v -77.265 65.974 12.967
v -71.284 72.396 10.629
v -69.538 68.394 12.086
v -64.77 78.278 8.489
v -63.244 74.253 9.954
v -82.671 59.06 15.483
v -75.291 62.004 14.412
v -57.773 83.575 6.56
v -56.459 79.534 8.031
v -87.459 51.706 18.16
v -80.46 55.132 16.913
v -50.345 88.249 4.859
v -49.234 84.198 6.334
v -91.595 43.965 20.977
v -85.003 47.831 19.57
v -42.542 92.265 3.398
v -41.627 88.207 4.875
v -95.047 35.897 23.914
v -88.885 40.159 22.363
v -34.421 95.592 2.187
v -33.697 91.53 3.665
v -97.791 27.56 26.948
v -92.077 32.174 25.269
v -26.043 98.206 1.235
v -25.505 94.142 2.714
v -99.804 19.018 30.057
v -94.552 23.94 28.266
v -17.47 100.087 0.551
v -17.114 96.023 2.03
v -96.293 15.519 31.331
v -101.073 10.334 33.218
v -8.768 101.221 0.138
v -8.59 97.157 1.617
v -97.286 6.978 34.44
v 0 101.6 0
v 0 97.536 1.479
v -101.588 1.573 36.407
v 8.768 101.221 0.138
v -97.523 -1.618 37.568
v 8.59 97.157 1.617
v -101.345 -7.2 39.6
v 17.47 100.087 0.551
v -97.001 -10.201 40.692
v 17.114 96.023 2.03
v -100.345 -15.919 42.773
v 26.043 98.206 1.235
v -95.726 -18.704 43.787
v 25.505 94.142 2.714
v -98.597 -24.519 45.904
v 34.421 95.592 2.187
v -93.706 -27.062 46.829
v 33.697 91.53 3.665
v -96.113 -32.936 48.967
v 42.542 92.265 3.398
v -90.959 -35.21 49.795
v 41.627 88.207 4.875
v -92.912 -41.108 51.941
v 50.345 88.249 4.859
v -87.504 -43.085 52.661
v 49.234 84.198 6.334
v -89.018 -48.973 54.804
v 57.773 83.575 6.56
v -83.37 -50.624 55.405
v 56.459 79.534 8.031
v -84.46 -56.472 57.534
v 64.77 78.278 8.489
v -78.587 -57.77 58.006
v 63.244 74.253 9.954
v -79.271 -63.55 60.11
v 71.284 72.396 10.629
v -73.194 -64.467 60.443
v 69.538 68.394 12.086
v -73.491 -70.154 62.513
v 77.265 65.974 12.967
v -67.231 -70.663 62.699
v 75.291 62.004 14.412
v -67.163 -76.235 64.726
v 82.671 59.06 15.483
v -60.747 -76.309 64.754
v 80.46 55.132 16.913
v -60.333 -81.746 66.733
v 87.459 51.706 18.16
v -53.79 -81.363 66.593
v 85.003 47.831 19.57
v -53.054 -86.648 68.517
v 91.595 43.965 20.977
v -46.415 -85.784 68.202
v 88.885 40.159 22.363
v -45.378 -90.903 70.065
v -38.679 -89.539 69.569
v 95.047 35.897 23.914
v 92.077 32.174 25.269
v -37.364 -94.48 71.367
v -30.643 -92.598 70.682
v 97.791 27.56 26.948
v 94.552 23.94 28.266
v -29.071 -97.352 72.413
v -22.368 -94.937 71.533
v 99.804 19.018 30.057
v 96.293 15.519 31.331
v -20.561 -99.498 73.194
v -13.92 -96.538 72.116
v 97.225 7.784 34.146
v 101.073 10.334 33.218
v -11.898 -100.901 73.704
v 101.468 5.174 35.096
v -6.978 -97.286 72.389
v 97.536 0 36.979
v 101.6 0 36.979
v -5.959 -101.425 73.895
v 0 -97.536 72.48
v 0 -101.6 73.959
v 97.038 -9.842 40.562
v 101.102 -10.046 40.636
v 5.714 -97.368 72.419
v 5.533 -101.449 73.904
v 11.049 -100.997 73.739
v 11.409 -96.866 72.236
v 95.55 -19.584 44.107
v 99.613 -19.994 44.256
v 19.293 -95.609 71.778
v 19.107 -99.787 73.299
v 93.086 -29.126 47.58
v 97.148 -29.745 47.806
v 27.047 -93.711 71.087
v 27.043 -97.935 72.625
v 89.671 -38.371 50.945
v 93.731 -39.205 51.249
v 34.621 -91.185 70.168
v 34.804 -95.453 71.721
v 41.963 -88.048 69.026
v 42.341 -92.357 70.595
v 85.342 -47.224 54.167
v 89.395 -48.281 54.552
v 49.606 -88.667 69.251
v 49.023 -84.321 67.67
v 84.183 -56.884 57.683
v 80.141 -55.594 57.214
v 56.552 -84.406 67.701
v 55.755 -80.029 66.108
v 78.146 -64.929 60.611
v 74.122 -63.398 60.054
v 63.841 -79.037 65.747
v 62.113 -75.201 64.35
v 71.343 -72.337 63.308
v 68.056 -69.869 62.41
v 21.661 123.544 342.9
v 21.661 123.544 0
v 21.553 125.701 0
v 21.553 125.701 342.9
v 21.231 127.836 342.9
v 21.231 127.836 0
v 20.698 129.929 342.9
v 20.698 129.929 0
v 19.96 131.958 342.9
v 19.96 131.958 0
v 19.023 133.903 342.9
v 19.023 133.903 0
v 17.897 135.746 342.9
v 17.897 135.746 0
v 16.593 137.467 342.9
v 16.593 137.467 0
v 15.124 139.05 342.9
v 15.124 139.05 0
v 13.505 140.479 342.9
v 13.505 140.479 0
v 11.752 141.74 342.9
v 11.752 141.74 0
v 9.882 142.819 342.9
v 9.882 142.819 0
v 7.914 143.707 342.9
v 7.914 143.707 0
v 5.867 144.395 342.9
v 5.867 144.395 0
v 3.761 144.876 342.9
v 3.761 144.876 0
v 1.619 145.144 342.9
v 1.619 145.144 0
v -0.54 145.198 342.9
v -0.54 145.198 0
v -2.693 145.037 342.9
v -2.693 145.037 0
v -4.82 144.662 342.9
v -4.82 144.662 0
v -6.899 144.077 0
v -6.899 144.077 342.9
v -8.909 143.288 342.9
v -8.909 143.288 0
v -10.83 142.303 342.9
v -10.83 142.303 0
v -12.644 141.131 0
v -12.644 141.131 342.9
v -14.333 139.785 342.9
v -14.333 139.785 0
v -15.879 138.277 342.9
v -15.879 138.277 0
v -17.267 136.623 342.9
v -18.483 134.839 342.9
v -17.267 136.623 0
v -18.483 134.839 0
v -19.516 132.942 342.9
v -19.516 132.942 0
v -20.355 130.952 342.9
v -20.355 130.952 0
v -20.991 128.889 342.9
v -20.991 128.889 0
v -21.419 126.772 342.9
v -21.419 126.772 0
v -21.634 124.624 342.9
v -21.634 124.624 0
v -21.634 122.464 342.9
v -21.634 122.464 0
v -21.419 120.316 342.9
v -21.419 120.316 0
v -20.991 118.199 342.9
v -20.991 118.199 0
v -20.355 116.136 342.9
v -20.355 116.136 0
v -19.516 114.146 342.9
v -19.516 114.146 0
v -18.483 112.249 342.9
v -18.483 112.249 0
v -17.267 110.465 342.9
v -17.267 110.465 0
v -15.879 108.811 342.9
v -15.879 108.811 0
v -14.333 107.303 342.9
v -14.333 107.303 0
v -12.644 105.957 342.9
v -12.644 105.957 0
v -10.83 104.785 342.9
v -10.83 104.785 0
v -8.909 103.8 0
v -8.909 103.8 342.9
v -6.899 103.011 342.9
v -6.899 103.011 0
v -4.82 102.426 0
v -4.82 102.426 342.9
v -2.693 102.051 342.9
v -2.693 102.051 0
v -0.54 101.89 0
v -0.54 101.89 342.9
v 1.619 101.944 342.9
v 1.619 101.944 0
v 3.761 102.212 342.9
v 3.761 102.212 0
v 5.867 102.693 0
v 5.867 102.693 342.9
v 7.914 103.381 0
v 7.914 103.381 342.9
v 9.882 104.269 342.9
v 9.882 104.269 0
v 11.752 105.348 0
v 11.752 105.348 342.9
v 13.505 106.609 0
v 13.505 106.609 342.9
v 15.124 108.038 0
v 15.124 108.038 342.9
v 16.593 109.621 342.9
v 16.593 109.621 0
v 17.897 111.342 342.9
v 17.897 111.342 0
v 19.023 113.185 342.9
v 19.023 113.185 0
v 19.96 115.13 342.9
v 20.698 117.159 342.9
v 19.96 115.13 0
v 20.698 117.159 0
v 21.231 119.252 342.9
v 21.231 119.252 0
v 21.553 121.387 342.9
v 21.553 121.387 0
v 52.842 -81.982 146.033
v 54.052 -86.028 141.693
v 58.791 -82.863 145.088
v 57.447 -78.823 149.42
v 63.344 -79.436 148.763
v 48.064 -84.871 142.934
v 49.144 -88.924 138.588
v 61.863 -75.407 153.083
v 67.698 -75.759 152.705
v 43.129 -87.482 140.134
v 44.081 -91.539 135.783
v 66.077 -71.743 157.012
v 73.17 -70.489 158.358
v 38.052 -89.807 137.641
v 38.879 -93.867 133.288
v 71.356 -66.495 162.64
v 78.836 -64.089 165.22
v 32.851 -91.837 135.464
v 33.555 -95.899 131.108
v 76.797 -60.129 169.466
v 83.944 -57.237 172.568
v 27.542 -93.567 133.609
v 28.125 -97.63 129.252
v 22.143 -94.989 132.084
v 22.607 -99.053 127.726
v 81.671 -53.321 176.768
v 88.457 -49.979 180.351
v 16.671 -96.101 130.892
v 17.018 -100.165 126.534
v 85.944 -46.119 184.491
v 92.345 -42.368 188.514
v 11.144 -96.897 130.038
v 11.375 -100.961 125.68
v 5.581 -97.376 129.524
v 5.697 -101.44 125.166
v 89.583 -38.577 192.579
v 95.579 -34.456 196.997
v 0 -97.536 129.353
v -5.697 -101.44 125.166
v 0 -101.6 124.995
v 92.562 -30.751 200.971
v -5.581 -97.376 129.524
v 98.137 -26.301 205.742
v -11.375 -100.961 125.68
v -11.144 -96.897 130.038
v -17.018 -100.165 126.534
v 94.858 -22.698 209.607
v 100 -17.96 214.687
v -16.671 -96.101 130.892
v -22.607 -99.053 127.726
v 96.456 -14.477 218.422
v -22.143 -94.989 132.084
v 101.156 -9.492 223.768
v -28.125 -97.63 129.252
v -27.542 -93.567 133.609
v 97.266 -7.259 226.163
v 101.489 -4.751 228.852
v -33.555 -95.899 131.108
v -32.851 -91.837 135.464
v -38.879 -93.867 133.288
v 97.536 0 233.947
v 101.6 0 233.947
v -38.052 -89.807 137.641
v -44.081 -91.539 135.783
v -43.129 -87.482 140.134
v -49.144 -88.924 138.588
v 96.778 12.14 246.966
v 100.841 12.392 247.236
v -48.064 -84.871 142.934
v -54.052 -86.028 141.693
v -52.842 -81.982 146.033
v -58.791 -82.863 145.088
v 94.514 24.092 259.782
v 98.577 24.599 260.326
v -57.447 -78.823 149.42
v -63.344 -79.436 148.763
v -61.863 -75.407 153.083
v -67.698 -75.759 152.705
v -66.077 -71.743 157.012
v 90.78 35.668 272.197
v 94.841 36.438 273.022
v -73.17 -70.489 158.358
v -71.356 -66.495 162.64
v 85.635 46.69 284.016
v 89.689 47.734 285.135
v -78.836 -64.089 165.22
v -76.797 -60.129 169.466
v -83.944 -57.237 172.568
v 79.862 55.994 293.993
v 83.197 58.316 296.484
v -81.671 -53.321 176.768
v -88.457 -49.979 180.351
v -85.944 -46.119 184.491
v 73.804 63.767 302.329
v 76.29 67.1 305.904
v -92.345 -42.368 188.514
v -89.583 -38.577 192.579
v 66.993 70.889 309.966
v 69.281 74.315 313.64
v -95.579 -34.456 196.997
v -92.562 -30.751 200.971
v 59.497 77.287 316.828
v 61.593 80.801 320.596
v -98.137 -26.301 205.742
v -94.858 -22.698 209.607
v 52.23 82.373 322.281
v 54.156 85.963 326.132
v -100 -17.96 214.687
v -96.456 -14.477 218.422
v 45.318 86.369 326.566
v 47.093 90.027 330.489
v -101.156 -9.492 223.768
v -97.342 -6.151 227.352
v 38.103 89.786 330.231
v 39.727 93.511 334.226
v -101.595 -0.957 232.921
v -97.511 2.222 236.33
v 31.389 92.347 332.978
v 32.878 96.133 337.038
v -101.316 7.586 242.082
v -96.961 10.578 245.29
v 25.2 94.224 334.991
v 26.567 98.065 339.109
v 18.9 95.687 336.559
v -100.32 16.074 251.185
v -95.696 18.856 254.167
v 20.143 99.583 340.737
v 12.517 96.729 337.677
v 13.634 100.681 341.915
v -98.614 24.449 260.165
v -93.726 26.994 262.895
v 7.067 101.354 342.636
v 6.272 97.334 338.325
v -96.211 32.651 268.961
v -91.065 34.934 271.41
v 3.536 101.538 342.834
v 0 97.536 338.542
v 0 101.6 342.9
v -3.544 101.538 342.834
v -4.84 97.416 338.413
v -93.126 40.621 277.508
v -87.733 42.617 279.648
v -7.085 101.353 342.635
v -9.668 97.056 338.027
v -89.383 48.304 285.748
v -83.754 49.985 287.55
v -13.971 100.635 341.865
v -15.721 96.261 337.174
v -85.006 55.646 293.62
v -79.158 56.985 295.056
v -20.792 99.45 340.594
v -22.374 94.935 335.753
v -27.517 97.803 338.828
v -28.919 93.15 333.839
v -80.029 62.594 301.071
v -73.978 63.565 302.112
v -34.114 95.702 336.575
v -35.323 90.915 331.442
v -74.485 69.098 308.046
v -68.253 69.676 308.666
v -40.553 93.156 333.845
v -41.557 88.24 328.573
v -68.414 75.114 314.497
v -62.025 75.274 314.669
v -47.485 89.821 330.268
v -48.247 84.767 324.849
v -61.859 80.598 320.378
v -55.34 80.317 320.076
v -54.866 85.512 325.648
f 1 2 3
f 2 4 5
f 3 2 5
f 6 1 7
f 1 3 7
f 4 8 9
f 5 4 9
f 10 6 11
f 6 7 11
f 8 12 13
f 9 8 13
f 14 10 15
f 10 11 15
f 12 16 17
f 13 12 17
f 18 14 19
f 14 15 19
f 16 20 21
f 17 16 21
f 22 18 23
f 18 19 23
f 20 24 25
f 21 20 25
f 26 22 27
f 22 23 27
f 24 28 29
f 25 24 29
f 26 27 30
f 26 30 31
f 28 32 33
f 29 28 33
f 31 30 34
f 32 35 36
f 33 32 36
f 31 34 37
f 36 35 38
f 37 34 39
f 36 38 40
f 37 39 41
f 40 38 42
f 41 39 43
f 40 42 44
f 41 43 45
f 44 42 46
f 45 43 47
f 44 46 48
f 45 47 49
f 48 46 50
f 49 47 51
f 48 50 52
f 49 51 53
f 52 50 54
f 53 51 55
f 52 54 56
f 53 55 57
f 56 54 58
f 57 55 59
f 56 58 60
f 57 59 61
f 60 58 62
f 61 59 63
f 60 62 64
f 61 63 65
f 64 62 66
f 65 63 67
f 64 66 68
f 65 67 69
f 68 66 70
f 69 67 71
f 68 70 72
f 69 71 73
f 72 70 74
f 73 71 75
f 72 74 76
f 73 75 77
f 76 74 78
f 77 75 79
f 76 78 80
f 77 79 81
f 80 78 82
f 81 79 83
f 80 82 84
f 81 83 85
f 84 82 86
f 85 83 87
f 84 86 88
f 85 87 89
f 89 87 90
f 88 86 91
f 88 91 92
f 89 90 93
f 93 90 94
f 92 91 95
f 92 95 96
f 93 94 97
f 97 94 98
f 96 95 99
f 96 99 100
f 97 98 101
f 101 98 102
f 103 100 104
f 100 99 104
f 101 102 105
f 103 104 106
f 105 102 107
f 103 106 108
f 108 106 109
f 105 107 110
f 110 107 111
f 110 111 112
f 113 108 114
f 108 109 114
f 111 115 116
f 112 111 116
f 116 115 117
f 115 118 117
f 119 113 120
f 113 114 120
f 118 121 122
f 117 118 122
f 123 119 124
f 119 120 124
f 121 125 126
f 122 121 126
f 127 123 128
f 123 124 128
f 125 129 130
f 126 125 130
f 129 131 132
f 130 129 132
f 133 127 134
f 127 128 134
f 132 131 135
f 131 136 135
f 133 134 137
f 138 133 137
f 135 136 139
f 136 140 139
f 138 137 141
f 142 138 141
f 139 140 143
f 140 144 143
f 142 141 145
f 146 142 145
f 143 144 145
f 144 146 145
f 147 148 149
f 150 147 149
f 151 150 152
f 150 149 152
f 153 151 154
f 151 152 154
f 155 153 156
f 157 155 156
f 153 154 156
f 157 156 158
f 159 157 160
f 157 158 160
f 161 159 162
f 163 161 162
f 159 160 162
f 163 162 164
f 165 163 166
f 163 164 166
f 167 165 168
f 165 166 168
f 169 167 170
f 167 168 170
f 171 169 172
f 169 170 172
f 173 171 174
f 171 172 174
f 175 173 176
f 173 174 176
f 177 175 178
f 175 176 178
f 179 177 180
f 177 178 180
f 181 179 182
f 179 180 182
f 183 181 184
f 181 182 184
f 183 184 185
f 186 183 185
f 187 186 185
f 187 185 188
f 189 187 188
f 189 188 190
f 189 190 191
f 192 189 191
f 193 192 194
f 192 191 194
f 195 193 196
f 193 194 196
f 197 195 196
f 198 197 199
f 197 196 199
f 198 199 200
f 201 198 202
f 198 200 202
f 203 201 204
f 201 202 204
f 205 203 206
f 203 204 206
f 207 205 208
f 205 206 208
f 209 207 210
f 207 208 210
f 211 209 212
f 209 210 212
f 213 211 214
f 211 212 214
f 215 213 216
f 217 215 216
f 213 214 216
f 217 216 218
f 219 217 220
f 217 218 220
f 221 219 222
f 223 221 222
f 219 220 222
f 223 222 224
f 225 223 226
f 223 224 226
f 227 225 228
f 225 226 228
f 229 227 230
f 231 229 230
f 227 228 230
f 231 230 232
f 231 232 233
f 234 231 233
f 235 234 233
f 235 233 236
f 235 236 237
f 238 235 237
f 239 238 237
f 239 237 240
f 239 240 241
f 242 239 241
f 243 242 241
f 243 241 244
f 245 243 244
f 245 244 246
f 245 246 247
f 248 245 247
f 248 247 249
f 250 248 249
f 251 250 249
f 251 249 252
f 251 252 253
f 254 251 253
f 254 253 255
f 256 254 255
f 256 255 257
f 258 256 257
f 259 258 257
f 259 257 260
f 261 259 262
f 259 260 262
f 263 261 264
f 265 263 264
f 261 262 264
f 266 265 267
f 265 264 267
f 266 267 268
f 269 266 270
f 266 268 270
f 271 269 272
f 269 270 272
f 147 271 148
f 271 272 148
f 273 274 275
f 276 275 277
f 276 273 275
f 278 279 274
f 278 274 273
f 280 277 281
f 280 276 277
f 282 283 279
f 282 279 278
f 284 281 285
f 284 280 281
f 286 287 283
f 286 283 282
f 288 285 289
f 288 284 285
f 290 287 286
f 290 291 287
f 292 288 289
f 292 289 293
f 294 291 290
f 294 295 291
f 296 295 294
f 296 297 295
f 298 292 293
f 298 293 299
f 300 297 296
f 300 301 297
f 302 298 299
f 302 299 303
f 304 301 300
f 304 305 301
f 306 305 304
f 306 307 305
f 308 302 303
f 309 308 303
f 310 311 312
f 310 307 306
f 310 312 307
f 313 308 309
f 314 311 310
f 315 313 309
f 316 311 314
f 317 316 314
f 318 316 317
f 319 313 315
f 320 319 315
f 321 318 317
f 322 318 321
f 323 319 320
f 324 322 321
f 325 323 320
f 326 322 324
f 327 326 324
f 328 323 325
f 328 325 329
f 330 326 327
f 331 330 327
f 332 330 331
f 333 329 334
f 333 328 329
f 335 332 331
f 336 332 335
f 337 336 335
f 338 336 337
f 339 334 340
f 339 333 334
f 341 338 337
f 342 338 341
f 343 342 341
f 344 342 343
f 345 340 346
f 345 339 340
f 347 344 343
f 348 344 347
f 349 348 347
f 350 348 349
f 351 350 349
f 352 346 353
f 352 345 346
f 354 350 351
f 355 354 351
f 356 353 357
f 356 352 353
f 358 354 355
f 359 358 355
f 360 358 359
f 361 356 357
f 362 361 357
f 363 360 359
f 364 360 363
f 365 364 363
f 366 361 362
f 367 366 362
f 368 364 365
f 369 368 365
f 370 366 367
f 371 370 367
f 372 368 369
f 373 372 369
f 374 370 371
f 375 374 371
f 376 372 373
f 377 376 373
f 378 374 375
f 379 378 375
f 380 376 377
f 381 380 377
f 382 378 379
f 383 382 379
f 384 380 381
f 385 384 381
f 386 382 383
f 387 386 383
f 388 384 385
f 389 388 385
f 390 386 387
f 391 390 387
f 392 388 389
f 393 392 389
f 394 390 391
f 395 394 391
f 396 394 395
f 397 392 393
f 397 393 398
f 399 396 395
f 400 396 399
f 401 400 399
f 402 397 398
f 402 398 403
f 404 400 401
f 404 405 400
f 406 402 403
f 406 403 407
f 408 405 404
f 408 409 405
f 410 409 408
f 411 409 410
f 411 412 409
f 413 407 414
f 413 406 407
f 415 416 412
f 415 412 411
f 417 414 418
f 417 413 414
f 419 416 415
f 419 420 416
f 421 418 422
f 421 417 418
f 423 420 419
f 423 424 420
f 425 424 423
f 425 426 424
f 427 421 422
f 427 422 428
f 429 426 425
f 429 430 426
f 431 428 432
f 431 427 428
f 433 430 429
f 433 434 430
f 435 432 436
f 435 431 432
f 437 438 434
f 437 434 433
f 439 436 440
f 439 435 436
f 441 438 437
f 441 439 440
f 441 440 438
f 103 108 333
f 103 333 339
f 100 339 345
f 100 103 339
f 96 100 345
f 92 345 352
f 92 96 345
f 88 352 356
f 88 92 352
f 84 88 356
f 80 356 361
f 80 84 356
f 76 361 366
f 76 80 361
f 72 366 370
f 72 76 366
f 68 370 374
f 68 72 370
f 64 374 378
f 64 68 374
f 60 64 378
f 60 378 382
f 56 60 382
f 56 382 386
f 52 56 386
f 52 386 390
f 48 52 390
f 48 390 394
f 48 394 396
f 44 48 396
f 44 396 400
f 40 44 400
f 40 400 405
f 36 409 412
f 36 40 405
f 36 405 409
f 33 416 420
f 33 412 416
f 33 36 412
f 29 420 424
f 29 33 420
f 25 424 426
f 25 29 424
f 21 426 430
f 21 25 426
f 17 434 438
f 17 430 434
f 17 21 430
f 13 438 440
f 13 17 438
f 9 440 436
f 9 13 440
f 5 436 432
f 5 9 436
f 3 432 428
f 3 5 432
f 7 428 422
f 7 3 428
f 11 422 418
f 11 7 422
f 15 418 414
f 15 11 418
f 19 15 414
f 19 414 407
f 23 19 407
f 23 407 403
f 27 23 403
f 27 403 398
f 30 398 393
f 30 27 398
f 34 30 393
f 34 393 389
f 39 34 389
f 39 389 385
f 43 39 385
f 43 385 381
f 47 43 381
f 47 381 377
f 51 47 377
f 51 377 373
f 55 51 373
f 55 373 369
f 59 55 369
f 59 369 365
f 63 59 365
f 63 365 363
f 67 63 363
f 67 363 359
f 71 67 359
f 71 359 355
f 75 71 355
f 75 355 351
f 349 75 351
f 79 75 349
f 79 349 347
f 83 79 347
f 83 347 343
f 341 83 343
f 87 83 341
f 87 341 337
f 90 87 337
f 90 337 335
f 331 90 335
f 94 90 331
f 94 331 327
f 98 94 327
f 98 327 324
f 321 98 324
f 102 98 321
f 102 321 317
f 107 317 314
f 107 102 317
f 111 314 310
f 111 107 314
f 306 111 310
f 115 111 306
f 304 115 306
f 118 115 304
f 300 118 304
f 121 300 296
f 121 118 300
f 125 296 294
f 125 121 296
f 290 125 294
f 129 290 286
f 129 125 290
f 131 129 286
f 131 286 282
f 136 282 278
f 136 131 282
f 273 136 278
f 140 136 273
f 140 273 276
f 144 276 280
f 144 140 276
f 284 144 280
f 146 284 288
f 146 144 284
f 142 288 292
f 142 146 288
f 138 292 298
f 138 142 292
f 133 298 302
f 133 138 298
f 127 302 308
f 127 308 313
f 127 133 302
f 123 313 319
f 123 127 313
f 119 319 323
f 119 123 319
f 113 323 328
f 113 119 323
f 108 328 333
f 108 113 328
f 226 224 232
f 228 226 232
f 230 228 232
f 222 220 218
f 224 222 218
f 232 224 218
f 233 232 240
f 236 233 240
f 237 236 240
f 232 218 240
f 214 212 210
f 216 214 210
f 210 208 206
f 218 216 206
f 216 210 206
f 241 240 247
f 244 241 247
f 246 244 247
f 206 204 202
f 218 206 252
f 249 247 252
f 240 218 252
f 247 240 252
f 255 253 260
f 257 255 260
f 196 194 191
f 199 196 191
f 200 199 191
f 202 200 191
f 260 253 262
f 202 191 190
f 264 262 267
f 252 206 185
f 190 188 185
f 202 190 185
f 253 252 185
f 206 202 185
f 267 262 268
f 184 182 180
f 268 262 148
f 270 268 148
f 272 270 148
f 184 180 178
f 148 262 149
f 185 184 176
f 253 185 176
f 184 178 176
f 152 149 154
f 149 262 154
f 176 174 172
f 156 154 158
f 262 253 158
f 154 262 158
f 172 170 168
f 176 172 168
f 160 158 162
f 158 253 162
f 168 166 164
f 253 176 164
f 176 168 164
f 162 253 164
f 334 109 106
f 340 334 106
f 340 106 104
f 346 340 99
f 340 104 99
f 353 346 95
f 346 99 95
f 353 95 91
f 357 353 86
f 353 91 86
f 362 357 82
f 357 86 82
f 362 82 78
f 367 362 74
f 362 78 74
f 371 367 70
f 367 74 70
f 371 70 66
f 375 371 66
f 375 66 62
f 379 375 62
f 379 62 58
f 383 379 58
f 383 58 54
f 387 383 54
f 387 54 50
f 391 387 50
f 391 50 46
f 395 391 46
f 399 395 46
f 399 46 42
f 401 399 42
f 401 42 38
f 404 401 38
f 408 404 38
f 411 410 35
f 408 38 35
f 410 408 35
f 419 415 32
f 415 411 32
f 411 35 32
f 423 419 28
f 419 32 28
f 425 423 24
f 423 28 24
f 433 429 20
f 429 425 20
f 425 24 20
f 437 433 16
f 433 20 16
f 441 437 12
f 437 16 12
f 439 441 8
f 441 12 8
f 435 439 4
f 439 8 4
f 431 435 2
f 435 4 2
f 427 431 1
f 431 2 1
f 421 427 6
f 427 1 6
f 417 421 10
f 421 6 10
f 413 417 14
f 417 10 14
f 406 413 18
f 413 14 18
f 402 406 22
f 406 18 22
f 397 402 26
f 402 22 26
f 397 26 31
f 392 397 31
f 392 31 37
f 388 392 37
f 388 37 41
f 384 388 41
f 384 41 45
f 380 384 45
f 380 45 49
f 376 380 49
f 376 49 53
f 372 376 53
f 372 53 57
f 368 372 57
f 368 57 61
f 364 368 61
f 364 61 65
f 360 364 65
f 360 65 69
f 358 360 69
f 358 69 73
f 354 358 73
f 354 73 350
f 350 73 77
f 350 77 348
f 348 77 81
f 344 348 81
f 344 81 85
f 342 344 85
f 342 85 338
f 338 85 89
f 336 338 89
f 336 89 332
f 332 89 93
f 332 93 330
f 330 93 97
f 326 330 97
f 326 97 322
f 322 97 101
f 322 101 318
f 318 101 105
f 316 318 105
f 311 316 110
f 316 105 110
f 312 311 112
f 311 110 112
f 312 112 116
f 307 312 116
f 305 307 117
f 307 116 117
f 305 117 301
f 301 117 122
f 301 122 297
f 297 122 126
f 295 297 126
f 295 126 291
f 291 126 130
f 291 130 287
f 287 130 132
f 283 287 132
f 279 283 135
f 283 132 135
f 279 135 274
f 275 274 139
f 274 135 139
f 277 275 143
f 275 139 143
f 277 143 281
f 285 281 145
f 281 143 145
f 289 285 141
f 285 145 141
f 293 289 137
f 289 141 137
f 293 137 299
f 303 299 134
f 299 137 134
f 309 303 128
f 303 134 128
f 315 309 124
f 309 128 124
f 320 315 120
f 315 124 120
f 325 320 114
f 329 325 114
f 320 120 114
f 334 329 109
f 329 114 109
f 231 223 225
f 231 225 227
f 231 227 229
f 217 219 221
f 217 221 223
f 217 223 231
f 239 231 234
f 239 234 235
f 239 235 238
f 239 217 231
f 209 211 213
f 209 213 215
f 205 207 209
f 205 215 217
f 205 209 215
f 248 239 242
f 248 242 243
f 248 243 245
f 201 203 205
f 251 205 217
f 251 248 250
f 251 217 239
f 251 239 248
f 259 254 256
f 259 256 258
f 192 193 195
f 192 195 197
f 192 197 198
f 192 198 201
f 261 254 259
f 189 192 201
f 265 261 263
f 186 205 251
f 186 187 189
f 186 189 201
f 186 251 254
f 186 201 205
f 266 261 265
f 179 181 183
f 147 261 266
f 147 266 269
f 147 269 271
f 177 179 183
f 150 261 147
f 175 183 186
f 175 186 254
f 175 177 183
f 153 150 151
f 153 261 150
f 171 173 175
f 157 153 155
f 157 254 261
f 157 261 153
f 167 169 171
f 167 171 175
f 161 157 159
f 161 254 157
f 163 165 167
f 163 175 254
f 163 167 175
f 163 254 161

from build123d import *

# Parameters (mm, degrees)
F0_R          = 101.6
F0_R_2        = 97.536
F1_DEPTH      = 342.9
F3_DEPTH      = 101.601
F3_DEPTH_BACK = 101.601
F4_R          = 21.660822
F5_DEPTH      = 342.9


with BuildPart() as f1:
    # F0 (on Top) → F1 (new body)
    with BuildSketch(Plane.XY):
        Circle(F0_R)
        Circle(F0_R_2, mode=Mode.SUBTRACT)
    extrude(amount=F1_DEPTH)

    # F2 (on Right) → F3 (cut, two sides)
    with BuildSketch(Plane.YZ) as f3_sk:
        Polygon((-101.6, 124.994678), (101.6, 342.9), (-101.6, 342.9), align=None)
        Polygon((-101.6, 0), (101.6, 0), (-101.6, 73.958752), align=None)
    extrude(amount=F3_DEPTH, mode=Mode.SUBTRACT)
    extrude(f3_sk.sketch, amount=-F3_DEPTH_BACK, mode=Mode.SUBTRACT)


with BuildPart() as f5:
    # F4 (on Top) → F5 (new body)
    with BuildSketch(Plane.XY):
        with Locations((0, 123.543993)):
            Circle(F4_R)
    extrude(amount=F5_DEPTH)


solid = Compound([f1.part, f5.part])
